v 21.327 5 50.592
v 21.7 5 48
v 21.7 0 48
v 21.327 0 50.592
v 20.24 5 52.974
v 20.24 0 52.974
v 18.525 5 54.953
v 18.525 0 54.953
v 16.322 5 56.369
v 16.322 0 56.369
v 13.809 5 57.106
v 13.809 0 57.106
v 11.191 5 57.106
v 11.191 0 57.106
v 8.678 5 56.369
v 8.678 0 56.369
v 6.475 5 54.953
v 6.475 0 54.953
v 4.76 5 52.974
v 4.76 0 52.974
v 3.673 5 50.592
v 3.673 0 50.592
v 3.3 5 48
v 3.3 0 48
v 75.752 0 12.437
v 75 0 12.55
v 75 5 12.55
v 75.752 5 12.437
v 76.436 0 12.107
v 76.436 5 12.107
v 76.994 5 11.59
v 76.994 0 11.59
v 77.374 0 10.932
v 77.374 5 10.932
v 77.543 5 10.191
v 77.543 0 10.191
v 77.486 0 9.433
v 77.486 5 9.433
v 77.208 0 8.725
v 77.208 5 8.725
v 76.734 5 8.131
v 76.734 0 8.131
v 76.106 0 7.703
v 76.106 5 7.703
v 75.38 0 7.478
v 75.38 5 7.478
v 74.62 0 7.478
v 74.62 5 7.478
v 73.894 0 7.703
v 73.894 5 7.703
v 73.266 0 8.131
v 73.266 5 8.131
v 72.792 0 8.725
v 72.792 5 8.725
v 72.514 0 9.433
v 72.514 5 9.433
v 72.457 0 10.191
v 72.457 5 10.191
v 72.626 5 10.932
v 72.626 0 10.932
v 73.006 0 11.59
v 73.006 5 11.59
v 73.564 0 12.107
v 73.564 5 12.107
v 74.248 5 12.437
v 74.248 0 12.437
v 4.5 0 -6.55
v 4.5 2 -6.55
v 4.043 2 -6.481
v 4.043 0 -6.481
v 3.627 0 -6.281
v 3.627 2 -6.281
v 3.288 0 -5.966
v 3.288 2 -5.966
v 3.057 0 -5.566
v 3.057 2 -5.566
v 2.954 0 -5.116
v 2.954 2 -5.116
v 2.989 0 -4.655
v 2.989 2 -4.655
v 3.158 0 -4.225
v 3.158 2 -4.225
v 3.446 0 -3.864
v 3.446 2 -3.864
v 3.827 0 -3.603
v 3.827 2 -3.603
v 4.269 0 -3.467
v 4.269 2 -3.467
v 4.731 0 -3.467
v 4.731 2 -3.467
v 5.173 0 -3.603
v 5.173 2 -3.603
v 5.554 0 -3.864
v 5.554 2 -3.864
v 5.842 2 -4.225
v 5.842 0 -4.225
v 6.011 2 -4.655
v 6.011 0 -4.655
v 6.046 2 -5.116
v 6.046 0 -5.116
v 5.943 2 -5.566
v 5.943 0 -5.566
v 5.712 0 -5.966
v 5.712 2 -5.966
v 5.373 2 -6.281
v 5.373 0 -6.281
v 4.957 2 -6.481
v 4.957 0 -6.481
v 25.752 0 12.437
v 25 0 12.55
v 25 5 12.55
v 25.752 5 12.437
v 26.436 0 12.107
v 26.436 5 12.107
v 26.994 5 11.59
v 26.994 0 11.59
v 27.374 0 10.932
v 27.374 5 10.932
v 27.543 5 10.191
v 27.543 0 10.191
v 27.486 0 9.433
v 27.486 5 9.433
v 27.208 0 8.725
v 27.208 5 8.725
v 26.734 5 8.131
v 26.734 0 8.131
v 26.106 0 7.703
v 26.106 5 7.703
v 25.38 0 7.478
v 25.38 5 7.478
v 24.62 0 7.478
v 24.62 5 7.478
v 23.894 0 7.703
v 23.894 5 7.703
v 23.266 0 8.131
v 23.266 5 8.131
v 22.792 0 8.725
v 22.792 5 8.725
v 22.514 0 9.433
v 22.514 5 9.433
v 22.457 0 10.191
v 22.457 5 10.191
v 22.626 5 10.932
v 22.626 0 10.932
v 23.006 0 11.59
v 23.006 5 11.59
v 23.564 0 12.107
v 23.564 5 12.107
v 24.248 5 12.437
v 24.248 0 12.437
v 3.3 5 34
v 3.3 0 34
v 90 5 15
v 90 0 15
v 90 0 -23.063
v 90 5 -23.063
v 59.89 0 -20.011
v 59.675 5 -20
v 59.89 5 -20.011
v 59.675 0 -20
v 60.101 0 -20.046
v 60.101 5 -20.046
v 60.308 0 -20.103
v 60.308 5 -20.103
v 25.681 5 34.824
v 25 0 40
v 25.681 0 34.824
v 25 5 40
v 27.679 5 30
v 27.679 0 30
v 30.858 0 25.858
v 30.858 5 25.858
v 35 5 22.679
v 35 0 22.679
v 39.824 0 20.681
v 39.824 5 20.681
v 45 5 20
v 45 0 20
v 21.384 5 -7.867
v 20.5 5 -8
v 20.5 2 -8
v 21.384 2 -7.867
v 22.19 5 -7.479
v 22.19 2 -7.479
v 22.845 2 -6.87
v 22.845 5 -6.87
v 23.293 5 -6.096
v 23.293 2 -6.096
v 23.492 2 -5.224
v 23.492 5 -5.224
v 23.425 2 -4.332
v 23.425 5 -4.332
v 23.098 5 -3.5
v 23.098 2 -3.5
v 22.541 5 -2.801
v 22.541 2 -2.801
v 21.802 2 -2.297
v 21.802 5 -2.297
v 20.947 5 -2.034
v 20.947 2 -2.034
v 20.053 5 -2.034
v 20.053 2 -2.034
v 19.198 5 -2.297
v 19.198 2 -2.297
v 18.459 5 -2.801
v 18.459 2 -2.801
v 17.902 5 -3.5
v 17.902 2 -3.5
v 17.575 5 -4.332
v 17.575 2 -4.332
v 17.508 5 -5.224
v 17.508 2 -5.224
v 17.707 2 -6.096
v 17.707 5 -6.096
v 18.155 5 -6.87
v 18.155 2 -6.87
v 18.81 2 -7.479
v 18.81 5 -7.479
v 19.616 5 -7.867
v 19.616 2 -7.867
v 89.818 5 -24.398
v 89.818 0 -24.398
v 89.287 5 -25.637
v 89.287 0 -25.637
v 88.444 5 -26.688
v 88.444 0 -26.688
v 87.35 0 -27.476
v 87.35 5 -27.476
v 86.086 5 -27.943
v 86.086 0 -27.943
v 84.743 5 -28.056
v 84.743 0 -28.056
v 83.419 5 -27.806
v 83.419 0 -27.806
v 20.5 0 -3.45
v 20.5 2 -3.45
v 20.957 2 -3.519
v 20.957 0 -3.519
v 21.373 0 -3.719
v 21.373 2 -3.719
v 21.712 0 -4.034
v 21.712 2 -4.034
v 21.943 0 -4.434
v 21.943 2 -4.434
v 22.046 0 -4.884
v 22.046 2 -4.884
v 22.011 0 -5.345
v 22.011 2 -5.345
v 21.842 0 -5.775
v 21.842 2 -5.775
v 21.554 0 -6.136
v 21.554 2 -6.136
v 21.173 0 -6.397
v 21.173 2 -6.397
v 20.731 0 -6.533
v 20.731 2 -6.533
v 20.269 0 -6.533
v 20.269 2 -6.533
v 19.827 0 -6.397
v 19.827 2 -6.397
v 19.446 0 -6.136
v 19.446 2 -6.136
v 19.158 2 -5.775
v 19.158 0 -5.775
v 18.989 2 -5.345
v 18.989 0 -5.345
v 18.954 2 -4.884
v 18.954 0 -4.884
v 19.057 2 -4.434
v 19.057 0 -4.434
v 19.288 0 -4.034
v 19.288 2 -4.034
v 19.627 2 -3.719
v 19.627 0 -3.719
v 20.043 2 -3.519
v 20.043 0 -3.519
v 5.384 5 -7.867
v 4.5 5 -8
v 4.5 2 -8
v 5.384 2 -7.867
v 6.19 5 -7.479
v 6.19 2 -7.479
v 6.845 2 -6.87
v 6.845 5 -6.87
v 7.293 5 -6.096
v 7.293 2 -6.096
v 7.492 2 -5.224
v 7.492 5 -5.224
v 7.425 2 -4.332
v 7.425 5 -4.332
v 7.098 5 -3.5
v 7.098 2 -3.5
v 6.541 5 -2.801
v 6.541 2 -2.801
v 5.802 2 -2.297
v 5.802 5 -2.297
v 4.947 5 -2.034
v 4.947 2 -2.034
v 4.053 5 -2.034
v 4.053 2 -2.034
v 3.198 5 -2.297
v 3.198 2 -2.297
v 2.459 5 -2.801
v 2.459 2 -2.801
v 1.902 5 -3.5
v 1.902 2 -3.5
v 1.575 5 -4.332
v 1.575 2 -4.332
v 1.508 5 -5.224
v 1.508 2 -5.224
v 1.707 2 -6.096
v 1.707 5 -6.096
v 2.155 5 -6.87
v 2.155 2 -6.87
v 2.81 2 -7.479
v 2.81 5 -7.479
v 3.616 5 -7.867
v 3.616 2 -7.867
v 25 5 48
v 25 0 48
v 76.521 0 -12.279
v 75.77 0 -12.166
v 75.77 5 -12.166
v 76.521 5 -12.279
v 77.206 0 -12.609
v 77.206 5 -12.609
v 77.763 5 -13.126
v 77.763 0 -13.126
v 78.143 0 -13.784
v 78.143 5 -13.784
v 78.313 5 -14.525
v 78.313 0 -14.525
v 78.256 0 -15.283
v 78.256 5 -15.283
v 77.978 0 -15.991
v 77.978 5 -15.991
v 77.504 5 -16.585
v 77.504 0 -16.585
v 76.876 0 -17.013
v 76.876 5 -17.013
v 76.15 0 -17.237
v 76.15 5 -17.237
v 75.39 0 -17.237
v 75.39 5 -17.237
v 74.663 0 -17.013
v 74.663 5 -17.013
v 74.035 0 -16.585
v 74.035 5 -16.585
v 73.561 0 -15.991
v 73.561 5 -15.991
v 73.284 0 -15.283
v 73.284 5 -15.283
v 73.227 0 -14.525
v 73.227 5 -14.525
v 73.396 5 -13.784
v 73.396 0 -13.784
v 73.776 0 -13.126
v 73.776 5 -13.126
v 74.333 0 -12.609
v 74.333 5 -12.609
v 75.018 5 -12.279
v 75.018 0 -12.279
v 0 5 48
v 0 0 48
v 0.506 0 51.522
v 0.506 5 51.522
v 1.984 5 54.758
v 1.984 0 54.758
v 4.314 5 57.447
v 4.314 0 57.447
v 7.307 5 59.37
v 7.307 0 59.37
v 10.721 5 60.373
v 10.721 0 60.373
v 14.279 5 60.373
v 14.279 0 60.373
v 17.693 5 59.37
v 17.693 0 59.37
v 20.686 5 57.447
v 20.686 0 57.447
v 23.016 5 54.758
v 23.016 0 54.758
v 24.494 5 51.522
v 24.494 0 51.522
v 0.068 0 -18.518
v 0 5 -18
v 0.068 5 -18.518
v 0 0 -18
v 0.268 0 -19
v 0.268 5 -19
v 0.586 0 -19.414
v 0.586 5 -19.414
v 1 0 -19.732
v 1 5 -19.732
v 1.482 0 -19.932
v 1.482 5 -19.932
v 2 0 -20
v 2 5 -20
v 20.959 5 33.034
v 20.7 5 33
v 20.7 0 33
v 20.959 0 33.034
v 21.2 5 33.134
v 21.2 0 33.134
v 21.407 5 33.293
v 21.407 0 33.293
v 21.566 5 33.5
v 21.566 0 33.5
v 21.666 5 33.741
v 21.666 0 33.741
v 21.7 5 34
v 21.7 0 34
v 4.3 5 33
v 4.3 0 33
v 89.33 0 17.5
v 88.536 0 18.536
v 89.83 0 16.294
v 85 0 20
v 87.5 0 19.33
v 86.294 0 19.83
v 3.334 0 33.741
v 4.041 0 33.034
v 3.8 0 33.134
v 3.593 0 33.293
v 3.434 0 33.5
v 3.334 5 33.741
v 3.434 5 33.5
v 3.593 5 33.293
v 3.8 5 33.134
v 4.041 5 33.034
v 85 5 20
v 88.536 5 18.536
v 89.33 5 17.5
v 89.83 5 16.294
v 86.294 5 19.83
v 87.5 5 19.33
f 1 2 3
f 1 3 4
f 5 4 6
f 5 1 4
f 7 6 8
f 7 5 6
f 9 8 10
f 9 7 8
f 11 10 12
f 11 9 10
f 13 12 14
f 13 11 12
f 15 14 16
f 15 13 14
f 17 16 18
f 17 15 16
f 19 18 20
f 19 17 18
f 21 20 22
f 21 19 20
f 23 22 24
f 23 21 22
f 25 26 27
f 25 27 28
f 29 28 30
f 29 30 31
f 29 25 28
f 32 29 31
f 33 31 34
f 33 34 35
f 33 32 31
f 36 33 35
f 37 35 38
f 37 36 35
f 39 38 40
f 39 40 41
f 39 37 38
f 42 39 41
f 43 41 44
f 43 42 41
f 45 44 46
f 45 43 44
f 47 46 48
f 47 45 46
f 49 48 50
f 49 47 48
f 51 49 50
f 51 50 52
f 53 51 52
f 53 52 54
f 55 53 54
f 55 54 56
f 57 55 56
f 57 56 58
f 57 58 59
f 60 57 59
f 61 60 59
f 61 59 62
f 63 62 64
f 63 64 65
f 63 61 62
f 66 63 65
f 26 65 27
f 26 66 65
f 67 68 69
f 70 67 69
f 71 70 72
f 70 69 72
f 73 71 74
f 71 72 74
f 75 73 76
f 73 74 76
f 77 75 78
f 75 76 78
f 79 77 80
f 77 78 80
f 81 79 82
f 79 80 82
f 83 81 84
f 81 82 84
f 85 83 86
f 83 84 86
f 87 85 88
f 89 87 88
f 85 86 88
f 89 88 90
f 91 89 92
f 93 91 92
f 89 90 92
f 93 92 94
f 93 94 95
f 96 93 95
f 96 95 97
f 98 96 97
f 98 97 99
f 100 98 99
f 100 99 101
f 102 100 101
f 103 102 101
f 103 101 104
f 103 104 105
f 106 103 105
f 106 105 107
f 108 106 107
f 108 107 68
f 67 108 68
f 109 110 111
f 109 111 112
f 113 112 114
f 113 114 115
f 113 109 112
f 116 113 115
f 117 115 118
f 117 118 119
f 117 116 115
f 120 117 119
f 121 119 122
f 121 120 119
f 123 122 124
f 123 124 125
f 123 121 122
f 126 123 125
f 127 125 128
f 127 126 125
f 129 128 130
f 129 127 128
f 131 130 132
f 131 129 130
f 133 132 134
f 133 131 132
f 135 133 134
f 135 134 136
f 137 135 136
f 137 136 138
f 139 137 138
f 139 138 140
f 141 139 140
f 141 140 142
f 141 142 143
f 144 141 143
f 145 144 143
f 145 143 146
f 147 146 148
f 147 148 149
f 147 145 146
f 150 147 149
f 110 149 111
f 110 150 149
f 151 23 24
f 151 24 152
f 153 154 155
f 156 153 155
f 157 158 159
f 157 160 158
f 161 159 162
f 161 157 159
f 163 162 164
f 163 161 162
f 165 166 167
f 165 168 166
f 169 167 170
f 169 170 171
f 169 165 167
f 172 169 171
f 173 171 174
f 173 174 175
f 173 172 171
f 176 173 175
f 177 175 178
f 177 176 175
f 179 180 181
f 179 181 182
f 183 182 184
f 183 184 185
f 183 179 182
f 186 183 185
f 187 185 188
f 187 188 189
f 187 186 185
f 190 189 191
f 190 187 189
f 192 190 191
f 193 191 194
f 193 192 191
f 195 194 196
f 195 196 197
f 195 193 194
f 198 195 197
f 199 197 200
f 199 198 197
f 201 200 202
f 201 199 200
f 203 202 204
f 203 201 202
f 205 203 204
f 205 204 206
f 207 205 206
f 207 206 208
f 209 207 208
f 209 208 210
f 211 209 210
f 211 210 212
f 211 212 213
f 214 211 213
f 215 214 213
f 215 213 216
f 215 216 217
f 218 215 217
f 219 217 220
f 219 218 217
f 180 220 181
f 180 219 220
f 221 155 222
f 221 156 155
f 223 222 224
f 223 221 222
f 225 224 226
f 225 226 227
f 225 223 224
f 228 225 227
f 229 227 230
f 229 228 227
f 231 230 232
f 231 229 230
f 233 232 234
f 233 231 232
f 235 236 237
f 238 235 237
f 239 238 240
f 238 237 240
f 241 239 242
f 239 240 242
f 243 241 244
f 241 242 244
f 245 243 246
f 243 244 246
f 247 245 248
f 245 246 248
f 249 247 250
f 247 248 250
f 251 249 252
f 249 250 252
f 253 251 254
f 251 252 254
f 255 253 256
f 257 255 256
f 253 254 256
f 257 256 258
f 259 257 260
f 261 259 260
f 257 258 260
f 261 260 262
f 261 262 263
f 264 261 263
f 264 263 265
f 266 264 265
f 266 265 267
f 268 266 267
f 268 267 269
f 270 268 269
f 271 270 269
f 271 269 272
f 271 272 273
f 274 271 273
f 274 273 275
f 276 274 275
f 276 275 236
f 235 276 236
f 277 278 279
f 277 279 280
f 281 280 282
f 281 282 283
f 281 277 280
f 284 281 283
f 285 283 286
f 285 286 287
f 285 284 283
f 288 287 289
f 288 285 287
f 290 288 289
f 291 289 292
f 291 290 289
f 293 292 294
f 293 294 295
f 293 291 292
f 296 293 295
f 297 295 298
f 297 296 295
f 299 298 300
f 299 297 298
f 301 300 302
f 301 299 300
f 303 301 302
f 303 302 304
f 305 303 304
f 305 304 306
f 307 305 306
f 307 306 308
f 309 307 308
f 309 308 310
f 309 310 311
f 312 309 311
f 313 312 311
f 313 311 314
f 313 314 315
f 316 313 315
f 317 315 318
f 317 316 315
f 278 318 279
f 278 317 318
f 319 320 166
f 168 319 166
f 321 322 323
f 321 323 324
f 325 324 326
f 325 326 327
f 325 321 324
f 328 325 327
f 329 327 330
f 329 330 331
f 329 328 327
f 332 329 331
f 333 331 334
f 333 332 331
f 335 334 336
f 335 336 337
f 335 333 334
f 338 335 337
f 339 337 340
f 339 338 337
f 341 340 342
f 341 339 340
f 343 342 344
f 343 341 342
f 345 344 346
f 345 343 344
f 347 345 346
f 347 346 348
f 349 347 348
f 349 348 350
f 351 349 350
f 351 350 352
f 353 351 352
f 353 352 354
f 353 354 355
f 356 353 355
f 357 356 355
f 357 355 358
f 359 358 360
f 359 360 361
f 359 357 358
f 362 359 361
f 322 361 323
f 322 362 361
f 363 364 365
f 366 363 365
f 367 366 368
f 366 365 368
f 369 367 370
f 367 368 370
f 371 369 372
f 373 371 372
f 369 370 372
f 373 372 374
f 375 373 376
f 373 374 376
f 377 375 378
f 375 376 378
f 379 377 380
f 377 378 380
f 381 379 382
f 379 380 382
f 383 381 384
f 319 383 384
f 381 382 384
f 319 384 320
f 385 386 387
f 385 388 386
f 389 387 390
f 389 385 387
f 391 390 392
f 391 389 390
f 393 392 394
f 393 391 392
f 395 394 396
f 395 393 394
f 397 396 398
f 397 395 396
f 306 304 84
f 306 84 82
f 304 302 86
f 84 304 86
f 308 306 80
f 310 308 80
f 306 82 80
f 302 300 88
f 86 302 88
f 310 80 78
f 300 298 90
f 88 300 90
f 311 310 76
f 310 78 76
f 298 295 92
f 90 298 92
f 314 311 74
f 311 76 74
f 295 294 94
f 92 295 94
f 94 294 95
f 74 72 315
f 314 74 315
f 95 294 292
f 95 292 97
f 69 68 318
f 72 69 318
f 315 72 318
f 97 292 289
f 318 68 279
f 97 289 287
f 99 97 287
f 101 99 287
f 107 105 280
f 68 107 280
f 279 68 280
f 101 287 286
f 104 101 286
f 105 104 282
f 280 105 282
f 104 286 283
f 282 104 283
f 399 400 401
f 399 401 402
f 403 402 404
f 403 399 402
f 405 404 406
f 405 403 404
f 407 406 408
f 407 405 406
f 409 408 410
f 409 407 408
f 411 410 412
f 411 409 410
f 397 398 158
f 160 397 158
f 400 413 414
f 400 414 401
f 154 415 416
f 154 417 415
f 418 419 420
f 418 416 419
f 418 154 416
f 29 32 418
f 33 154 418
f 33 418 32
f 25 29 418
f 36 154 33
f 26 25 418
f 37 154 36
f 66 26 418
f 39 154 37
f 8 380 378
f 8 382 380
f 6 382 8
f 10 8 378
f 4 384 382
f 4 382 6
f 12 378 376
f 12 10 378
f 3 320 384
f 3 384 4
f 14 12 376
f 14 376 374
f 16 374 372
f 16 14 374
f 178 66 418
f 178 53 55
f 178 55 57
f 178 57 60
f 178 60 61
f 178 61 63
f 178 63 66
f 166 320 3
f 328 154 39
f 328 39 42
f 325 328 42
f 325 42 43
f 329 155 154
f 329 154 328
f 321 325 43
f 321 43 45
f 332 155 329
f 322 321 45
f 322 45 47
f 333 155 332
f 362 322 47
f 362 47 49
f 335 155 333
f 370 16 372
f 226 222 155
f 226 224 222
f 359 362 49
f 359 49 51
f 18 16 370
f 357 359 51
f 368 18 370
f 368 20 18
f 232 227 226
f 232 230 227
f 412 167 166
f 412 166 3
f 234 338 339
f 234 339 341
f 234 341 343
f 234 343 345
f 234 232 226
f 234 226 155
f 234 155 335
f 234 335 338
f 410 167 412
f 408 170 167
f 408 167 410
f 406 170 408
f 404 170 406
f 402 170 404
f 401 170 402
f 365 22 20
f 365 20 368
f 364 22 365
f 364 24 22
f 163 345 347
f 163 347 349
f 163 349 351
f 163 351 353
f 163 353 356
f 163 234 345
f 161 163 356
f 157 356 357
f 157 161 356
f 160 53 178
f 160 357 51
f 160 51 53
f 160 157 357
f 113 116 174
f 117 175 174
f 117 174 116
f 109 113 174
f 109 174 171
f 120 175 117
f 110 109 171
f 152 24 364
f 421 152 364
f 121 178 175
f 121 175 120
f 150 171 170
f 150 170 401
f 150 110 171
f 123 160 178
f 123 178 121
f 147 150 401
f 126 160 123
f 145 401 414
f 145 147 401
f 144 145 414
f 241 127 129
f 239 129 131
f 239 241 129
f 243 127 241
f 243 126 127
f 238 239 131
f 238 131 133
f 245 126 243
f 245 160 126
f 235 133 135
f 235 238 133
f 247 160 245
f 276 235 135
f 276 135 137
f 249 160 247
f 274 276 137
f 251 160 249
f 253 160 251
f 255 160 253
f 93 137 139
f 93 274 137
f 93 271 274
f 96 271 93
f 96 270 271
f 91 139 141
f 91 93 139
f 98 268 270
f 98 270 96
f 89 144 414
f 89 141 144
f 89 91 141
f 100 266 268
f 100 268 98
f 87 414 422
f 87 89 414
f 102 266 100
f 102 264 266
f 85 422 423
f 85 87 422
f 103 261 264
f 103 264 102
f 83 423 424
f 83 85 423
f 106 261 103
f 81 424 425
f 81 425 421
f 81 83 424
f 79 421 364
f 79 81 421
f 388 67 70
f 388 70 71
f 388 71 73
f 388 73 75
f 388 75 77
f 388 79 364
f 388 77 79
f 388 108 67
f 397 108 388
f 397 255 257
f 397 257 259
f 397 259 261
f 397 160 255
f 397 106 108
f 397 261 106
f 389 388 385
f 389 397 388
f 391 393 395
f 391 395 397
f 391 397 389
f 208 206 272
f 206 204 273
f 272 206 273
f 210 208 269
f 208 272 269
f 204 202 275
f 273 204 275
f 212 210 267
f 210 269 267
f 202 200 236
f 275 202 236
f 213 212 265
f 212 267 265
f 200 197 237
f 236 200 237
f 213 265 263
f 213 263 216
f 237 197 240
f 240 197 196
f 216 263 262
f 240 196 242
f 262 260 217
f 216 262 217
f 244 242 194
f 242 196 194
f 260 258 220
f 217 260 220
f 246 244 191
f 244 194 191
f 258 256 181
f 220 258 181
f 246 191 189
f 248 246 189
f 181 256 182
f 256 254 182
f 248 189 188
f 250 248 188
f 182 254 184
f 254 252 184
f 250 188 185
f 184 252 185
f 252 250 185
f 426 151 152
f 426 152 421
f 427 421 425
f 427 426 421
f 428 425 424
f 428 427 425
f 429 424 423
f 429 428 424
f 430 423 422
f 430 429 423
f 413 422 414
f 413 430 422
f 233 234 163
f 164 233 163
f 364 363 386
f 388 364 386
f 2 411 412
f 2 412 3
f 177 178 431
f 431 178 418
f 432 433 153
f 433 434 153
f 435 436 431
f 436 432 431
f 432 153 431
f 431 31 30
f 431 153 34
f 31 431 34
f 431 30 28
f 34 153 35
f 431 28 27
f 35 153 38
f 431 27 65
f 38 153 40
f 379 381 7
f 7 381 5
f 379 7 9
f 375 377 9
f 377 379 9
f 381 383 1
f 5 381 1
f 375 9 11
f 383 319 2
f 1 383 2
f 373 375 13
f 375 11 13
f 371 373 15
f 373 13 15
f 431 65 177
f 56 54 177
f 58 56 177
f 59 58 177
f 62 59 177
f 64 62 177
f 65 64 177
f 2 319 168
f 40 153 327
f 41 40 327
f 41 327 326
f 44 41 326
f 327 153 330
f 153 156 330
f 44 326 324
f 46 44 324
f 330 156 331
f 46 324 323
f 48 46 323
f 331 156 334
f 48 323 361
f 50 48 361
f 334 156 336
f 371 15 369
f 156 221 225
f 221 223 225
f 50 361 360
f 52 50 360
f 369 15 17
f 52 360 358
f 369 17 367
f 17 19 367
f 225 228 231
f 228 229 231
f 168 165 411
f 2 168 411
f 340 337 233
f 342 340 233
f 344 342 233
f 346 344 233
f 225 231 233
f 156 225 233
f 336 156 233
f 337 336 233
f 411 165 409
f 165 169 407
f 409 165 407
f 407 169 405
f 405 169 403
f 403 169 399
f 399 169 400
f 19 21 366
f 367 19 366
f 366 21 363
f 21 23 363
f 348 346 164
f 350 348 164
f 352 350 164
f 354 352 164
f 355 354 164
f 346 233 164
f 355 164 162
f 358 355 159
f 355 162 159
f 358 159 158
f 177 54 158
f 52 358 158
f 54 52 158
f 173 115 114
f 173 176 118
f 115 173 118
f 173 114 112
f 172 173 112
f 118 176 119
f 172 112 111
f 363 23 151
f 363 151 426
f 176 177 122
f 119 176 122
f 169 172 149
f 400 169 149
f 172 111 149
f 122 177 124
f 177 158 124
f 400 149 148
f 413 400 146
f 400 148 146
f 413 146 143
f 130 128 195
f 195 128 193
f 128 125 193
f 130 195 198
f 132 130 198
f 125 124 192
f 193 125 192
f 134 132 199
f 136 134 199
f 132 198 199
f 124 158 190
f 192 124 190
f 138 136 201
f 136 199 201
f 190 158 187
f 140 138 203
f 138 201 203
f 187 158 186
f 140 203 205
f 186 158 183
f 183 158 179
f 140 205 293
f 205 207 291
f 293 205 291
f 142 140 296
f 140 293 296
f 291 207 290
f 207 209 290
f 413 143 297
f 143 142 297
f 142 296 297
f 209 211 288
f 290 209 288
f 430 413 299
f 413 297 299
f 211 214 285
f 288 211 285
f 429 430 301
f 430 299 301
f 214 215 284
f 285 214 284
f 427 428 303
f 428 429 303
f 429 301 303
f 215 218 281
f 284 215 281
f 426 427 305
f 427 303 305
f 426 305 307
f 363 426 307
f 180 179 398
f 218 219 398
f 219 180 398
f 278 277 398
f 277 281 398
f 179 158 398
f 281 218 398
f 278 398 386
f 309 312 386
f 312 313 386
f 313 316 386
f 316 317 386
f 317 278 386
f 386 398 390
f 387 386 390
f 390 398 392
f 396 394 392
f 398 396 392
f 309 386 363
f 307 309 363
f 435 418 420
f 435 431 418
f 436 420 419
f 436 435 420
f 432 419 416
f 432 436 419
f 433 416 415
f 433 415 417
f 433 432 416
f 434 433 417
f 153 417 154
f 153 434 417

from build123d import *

# Parameters (mm, degrees)
SKETCH_1_R          = 2.55
SKETCH_1_R_2        = 7.5
EXTRUDE_1_DEPTH     = 5
FILLET_1_R          = 20
FILLET_2_R          = 5
CUT_EXTRUDE_1_DEPTH = 109.559891304
EXTRUDE_2_DEPTH     = 5
SKETCH_3_R          = 1.55
CUT_EXTRUDE_2_DEPTH = 109.559891304
FILLET_3_R          = 2
SKETCH_5_R          = 3
CUT_EXTRUDE_3_DEPTH = 3


with BuildPart() as part:
    # ｽｹｯﾁ1 → ﾎﾞｽ - 押し出し1 (new body)
    with BuildSketch(Plane(origin=(0, 0, 0), x_dir=(1, 0, 0), z_dir=(0, 1, 0))):
        with BuildLine():
            Line((0, 0), (0, -48))
            ThreePointArc((0, -48), (12.5, -60.5), (25, -48))
            Line((25, -48), (25, -20))
            Line((25, -20), (90, -20))
            Line((90, -20), (90, 30))
            Line((90, 30), (0, 0))
        make_face()
        with Locations(Location((75.769750529, 14.715657976, 0), (0, 0, 270))):
            Circle(SKETCH_1_R, mode=Mode.SUBTRACT)
        with Locations(Location((75, -10, 0), (0, 0, 270))):
            Circle(SKETCH_1_R, mode=Mode.SUBTRACT)
        with Locations(Location((25, -10, 0), (0, 0, 270))):
            Circle(SKETCH_1_R, mode=Mode.SUBTRACT)
        with Locations(Location((12.5, -48, 0), (0, 0, 270))):
            Circle(SKETCH_1_R_2, mode=Mode.SUBTRACT)
    extrude(amount=EXTRUDE_1_DEPTH)

    # ﾌｨﾚｯﾄ1
    fillet_1_edges = [part.edges().sort_by_distance(p)[0] for p in [
        (25, 2.5, 20),
    ]]
    fillet(fillet_1_edges, radius=FILLET_1_R)

    # ﾌｨﾚｯﾄ2
    fillet_2_edges = [part.edges().sort_by_distance(p)[0] for p in [
        (90, 2.5, -30),
        (90, 2.5, 20),
    ]]
    fillet(fillet_2_edges, radius=FILLET_2_R)

    # ｽｹｯﾁ2 → ｶｯﾄ - 押し出し1 (cut, through all)
    with BuildSketch(Plane(origin=(0, 5, 0), x_dir=(1, 0, 0), z_dir=(0, 1, 0))):
        with BuildLine():
            Line((3.3, -48), (3.3, -34))
            ThreePointArc((3.3, -34), (3.592893219, -33.292893219), (4.3, -33))
            Line((4.3, -33), (20.7, -33))
            ThreePointArc((20.7, -33), (21.407106781, -33.292893219), (21.7, -34))
            Line((21.7, -34), (21.7, -48))
            ThreePointArc((21.7, -48), (12.5, -57.2), (3.3, -48))
        make_face()
    extrude(amount=-CUT_EXTRUDE_1_DEPTH, mode=Mode.SUBTRACT)

    # ｽｹｯﾁ4 → ﾎﾞｽ - 押し出し2 (add)
    with BuildSketch(Plane(origin=(0, 5, 0), x_dir=(1, 0, 0), z_dir=(0, 1, 0))):
        Polygon((0, 0), (0, 20), (60, 20), align=None)
    extrude(amount=-EXTRUDE_2_DEPTH)

    # ｽｹｯﾁ3 → ｶｯﾄ - 押し出し2 (cut, through all)
    with BuildSketch(Plane(origin=(0, 5, 0), x_dir=(1, 0, 0), z_dir=(0, 1, 0))):
        with Locations(Location((20.5, 5, 0), (0, 0, 270))):
            Circle(SKETCH_3_R)
        with Locations(Location((4.5, 5, 0), (0, 0, 90))):
            Circle(SKETCH_3_R)
    extrude(amount=-CUT_EXTRUDE_2_DEPTH, mode=Mode.SUBTRACT)

    # ﾌｨﾚｯﾄ3
    fillet_3_edges = [part.edges().sort_by_distance(p)[0] for p in [
        (60, 2.5, -20),
        (0, 2.5, -20),
    ]]
    fillet(fillet_3_edges, radius=FILLET_3_R)

    # ｽｹｯﾁ5 → ｶｯﾄ - 押し出し3 (cut)
    with BuildSketch(Plane.XZ.offset(-5)):
        with Locations(Location((4.5, -5, 0), (0, 0, 270))):
            Circle(SKETCH_5_R)
        with Locations(Location((20.5, -5, 0), (0, 0, 270))):
            Circle(SKETCH_5_R)
    extrude(amount=CUT_EXTRUDE_3_DEPTH, mode=Mode.SUBTRACT)


solid = part.part
